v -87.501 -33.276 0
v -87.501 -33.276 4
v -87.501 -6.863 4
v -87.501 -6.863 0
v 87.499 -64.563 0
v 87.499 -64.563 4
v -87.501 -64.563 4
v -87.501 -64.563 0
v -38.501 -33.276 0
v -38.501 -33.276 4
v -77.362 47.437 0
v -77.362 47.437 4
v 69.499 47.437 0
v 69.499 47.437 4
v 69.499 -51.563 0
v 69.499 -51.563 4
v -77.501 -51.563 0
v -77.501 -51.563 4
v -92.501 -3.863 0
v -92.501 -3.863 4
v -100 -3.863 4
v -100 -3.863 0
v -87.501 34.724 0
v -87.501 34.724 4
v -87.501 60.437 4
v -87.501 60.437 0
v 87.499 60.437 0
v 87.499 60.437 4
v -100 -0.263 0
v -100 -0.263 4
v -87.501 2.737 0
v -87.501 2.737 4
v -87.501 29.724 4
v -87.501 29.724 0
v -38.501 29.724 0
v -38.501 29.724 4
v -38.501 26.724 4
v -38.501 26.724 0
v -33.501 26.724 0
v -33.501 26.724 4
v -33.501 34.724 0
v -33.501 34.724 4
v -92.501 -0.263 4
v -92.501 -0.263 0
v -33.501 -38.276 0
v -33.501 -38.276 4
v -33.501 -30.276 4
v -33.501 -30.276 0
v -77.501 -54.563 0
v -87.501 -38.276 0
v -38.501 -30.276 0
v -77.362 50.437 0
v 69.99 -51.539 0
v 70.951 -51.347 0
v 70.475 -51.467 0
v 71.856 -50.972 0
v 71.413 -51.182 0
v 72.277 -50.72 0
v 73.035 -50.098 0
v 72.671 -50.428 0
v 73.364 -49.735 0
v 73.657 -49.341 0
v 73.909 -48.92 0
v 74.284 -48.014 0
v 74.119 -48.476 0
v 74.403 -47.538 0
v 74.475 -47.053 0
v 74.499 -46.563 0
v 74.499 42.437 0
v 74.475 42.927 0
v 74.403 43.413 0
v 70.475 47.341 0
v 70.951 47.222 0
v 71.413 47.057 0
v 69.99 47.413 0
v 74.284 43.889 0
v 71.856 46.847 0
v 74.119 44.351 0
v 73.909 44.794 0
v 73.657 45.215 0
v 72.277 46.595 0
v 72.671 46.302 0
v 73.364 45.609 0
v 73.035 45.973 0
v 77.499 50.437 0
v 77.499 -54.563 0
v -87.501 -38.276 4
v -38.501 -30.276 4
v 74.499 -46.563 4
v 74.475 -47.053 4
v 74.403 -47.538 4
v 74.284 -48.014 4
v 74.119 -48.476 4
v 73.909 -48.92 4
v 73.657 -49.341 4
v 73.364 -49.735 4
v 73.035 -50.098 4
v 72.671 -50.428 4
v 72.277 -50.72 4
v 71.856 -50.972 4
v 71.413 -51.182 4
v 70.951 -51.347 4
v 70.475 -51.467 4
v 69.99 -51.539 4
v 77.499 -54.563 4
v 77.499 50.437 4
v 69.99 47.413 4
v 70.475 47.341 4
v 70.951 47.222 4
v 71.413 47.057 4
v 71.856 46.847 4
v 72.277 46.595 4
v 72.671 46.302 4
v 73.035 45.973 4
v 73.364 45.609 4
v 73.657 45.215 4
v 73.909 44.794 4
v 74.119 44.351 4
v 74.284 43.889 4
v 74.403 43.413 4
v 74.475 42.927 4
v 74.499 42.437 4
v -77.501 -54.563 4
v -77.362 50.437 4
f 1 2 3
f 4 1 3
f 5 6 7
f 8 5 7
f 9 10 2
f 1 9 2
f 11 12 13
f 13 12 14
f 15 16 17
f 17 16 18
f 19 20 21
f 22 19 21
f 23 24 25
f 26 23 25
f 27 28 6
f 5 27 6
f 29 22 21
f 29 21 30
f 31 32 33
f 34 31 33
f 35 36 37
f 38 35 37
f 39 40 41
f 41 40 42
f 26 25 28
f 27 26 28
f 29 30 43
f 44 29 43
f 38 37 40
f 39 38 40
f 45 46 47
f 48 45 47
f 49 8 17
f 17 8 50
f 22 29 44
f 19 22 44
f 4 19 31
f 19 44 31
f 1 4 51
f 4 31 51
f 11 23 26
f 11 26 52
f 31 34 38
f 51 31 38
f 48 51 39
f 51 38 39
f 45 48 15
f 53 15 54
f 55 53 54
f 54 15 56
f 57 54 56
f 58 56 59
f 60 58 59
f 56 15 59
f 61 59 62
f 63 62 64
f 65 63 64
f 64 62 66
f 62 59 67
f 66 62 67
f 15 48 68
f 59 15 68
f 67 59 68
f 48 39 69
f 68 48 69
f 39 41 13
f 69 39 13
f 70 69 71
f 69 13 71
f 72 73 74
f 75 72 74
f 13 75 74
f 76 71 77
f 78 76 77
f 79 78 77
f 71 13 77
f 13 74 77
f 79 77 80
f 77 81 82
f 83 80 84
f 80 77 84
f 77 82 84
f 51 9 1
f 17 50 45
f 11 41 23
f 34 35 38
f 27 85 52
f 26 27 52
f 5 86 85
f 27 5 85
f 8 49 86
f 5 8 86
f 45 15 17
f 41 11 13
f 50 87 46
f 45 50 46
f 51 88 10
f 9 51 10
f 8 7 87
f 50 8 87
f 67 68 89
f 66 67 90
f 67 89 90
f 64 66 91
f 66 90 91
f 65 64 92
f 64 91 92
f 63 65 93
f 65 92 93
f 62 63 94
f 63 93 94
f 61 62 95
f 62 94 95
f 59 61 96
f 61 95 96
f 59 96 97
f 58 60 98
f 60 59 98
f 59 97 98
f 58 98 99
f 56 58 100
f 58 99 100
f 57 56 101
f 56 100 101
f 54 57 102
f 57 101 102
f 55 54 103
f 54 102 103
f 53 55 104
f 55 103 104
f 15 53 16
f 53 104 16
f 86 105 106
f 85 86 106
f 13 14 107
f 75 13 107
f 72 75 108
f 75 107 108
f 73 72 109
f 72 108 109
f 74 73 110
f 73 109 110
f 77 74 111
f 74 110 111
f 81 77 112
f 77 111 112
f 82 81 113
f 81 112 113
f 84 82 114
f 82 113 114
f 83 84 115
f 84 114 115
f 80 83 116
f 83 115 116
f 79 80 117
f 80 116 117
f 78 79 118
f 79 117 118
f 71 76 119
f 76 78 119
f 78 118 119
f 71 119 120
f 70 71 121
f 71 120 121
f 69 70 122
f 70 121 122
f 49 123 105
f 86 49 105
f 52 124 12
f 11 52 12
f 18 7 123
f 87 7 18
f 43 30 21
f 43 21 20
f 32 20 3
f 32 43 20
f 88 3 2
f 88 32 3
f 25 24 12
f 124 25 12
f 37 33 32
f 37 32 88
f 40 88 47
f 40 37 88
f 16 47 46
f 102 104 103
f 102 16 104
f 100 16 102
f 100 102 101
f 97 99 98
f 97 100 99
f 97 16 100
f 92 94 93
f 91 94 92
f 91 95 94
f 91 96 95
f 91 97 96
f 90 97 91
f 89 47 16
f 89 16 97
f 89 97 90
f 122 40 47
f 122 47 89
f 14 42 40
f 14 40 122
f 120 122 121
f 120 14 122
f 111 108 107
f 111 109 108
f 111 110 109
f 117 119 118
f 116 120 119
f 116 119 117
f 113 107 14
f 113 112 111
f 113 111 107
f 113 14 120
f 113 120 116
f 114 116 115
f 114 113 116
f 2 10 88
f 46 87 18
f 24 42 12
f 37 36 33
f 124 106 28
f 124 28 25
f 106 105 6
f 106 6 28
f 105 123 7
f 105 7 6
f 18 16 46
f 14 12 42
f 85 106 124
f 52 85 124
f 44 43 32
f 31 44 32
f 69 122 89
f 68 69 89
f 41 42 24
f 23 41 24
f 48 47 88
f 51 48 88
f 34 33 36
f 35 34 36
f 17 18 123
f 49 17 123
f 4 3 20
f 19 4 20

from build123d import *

# Parameters (mm, degrees)
F0_W     = 200
F0_H     = 150
F1_DEPTH = 4
F3_DEPTH = 25


with BuildPart() as f1:
    # F0 (on Top) → F1 (new body)
    with BuildSketch(Plane.XY):
        Rectangle(F0_W, F0_H)
    extrude(amount=F1_DEPTH)

    # F2 (on face) → F3 (cut)
    with BuildSketch(Plane.XY.offset(4)):
        Polygon((-87.500563, 60.43724), (87.499437, 60.43724), (87.499437, -64.56276), (-77.500563, -64.56276), (-87.500563, -64.56276), (-87.500563, -38.276056), (-46.000563, -38.276056), (-41.000563, -38.276056), (-33.500563, -38.276056), (-33.500563, -30.276056), (-38.500563, -30.276056), (-38.500563, -33.276056), (-87.500563, -33.276056), (-87.500563, -6.86276), (-92.500563, -3.86276), (-100, -3.86276), (-100, -75), (100, -75), (100, 75), (-100, 75), (-100, -0.26276), (-92.500563, -0.26276), (-87.500563, 2.73724), (-87.500563, 29.723944), (-46.000563, 29.723944), (-38.500563, 29.723944), (-38.500563, 26.723944), (-33.500563, 26.723944), (-33.500563, 34.723944), (-41.000563, 34.723944), (-87.500563, 34.723944), align=None)
        with BuildLine():
            Line((60.637614, 50.43724), (-74.362386, 50.43724))
            Line((-74.362386, 50.43724), (-77.362386, 50.43724))
            Line((-77.362386, 50.43724), (-77.362386, 47.43724))
            Line((-77.362386, 47.43724), (-74.362386, 47.43724))
            Line((-74.362386, 47.43724), (57.637614, 47.43724))
            Line((57.637614, 47.43724), (60.637614, 47.43724))
            Line((60.637614, 47.43724), (69.499437, 47.43724))
            ThreePointArc((69.499437, 47.43724), (73.034971, 45.972774), (74.499437, 42.43724))
            Line((74.499437, 42.43724), (74.499437, -46.56276))
            ThreePointArc((74.499437, -46.56276), (73.034971, -50.098294), (69.499437, -51.56276))
            Line((69.499437, -51.56276), (60.637614, -51.56276))
            Line((60.637614, -51.56276), (-77.500563, -51.56276))
            Line((-77.500563, -51.56276), (-77.500563, -54.56276))
            Line((-77.500563, -54.56276), (60.637614, -54.56276))
            Line((60.637614, -54.56276), (77.499437, -54.56276))
            Line((77.499437, -54.56276), (77.499437, 47.43724))
            Line((77.499437, 47.43724), (77.499437, 50.43724))
            Line((77.499437, 50.43724), (74.499437, 50.43724))
            Line((74.499437, 50.43724), (60.637614, 50.43724))
        make_face()
    extrude(amount=-F3_DEPTH, mode=Mode.SUBTRACT)


solid = f1.part
